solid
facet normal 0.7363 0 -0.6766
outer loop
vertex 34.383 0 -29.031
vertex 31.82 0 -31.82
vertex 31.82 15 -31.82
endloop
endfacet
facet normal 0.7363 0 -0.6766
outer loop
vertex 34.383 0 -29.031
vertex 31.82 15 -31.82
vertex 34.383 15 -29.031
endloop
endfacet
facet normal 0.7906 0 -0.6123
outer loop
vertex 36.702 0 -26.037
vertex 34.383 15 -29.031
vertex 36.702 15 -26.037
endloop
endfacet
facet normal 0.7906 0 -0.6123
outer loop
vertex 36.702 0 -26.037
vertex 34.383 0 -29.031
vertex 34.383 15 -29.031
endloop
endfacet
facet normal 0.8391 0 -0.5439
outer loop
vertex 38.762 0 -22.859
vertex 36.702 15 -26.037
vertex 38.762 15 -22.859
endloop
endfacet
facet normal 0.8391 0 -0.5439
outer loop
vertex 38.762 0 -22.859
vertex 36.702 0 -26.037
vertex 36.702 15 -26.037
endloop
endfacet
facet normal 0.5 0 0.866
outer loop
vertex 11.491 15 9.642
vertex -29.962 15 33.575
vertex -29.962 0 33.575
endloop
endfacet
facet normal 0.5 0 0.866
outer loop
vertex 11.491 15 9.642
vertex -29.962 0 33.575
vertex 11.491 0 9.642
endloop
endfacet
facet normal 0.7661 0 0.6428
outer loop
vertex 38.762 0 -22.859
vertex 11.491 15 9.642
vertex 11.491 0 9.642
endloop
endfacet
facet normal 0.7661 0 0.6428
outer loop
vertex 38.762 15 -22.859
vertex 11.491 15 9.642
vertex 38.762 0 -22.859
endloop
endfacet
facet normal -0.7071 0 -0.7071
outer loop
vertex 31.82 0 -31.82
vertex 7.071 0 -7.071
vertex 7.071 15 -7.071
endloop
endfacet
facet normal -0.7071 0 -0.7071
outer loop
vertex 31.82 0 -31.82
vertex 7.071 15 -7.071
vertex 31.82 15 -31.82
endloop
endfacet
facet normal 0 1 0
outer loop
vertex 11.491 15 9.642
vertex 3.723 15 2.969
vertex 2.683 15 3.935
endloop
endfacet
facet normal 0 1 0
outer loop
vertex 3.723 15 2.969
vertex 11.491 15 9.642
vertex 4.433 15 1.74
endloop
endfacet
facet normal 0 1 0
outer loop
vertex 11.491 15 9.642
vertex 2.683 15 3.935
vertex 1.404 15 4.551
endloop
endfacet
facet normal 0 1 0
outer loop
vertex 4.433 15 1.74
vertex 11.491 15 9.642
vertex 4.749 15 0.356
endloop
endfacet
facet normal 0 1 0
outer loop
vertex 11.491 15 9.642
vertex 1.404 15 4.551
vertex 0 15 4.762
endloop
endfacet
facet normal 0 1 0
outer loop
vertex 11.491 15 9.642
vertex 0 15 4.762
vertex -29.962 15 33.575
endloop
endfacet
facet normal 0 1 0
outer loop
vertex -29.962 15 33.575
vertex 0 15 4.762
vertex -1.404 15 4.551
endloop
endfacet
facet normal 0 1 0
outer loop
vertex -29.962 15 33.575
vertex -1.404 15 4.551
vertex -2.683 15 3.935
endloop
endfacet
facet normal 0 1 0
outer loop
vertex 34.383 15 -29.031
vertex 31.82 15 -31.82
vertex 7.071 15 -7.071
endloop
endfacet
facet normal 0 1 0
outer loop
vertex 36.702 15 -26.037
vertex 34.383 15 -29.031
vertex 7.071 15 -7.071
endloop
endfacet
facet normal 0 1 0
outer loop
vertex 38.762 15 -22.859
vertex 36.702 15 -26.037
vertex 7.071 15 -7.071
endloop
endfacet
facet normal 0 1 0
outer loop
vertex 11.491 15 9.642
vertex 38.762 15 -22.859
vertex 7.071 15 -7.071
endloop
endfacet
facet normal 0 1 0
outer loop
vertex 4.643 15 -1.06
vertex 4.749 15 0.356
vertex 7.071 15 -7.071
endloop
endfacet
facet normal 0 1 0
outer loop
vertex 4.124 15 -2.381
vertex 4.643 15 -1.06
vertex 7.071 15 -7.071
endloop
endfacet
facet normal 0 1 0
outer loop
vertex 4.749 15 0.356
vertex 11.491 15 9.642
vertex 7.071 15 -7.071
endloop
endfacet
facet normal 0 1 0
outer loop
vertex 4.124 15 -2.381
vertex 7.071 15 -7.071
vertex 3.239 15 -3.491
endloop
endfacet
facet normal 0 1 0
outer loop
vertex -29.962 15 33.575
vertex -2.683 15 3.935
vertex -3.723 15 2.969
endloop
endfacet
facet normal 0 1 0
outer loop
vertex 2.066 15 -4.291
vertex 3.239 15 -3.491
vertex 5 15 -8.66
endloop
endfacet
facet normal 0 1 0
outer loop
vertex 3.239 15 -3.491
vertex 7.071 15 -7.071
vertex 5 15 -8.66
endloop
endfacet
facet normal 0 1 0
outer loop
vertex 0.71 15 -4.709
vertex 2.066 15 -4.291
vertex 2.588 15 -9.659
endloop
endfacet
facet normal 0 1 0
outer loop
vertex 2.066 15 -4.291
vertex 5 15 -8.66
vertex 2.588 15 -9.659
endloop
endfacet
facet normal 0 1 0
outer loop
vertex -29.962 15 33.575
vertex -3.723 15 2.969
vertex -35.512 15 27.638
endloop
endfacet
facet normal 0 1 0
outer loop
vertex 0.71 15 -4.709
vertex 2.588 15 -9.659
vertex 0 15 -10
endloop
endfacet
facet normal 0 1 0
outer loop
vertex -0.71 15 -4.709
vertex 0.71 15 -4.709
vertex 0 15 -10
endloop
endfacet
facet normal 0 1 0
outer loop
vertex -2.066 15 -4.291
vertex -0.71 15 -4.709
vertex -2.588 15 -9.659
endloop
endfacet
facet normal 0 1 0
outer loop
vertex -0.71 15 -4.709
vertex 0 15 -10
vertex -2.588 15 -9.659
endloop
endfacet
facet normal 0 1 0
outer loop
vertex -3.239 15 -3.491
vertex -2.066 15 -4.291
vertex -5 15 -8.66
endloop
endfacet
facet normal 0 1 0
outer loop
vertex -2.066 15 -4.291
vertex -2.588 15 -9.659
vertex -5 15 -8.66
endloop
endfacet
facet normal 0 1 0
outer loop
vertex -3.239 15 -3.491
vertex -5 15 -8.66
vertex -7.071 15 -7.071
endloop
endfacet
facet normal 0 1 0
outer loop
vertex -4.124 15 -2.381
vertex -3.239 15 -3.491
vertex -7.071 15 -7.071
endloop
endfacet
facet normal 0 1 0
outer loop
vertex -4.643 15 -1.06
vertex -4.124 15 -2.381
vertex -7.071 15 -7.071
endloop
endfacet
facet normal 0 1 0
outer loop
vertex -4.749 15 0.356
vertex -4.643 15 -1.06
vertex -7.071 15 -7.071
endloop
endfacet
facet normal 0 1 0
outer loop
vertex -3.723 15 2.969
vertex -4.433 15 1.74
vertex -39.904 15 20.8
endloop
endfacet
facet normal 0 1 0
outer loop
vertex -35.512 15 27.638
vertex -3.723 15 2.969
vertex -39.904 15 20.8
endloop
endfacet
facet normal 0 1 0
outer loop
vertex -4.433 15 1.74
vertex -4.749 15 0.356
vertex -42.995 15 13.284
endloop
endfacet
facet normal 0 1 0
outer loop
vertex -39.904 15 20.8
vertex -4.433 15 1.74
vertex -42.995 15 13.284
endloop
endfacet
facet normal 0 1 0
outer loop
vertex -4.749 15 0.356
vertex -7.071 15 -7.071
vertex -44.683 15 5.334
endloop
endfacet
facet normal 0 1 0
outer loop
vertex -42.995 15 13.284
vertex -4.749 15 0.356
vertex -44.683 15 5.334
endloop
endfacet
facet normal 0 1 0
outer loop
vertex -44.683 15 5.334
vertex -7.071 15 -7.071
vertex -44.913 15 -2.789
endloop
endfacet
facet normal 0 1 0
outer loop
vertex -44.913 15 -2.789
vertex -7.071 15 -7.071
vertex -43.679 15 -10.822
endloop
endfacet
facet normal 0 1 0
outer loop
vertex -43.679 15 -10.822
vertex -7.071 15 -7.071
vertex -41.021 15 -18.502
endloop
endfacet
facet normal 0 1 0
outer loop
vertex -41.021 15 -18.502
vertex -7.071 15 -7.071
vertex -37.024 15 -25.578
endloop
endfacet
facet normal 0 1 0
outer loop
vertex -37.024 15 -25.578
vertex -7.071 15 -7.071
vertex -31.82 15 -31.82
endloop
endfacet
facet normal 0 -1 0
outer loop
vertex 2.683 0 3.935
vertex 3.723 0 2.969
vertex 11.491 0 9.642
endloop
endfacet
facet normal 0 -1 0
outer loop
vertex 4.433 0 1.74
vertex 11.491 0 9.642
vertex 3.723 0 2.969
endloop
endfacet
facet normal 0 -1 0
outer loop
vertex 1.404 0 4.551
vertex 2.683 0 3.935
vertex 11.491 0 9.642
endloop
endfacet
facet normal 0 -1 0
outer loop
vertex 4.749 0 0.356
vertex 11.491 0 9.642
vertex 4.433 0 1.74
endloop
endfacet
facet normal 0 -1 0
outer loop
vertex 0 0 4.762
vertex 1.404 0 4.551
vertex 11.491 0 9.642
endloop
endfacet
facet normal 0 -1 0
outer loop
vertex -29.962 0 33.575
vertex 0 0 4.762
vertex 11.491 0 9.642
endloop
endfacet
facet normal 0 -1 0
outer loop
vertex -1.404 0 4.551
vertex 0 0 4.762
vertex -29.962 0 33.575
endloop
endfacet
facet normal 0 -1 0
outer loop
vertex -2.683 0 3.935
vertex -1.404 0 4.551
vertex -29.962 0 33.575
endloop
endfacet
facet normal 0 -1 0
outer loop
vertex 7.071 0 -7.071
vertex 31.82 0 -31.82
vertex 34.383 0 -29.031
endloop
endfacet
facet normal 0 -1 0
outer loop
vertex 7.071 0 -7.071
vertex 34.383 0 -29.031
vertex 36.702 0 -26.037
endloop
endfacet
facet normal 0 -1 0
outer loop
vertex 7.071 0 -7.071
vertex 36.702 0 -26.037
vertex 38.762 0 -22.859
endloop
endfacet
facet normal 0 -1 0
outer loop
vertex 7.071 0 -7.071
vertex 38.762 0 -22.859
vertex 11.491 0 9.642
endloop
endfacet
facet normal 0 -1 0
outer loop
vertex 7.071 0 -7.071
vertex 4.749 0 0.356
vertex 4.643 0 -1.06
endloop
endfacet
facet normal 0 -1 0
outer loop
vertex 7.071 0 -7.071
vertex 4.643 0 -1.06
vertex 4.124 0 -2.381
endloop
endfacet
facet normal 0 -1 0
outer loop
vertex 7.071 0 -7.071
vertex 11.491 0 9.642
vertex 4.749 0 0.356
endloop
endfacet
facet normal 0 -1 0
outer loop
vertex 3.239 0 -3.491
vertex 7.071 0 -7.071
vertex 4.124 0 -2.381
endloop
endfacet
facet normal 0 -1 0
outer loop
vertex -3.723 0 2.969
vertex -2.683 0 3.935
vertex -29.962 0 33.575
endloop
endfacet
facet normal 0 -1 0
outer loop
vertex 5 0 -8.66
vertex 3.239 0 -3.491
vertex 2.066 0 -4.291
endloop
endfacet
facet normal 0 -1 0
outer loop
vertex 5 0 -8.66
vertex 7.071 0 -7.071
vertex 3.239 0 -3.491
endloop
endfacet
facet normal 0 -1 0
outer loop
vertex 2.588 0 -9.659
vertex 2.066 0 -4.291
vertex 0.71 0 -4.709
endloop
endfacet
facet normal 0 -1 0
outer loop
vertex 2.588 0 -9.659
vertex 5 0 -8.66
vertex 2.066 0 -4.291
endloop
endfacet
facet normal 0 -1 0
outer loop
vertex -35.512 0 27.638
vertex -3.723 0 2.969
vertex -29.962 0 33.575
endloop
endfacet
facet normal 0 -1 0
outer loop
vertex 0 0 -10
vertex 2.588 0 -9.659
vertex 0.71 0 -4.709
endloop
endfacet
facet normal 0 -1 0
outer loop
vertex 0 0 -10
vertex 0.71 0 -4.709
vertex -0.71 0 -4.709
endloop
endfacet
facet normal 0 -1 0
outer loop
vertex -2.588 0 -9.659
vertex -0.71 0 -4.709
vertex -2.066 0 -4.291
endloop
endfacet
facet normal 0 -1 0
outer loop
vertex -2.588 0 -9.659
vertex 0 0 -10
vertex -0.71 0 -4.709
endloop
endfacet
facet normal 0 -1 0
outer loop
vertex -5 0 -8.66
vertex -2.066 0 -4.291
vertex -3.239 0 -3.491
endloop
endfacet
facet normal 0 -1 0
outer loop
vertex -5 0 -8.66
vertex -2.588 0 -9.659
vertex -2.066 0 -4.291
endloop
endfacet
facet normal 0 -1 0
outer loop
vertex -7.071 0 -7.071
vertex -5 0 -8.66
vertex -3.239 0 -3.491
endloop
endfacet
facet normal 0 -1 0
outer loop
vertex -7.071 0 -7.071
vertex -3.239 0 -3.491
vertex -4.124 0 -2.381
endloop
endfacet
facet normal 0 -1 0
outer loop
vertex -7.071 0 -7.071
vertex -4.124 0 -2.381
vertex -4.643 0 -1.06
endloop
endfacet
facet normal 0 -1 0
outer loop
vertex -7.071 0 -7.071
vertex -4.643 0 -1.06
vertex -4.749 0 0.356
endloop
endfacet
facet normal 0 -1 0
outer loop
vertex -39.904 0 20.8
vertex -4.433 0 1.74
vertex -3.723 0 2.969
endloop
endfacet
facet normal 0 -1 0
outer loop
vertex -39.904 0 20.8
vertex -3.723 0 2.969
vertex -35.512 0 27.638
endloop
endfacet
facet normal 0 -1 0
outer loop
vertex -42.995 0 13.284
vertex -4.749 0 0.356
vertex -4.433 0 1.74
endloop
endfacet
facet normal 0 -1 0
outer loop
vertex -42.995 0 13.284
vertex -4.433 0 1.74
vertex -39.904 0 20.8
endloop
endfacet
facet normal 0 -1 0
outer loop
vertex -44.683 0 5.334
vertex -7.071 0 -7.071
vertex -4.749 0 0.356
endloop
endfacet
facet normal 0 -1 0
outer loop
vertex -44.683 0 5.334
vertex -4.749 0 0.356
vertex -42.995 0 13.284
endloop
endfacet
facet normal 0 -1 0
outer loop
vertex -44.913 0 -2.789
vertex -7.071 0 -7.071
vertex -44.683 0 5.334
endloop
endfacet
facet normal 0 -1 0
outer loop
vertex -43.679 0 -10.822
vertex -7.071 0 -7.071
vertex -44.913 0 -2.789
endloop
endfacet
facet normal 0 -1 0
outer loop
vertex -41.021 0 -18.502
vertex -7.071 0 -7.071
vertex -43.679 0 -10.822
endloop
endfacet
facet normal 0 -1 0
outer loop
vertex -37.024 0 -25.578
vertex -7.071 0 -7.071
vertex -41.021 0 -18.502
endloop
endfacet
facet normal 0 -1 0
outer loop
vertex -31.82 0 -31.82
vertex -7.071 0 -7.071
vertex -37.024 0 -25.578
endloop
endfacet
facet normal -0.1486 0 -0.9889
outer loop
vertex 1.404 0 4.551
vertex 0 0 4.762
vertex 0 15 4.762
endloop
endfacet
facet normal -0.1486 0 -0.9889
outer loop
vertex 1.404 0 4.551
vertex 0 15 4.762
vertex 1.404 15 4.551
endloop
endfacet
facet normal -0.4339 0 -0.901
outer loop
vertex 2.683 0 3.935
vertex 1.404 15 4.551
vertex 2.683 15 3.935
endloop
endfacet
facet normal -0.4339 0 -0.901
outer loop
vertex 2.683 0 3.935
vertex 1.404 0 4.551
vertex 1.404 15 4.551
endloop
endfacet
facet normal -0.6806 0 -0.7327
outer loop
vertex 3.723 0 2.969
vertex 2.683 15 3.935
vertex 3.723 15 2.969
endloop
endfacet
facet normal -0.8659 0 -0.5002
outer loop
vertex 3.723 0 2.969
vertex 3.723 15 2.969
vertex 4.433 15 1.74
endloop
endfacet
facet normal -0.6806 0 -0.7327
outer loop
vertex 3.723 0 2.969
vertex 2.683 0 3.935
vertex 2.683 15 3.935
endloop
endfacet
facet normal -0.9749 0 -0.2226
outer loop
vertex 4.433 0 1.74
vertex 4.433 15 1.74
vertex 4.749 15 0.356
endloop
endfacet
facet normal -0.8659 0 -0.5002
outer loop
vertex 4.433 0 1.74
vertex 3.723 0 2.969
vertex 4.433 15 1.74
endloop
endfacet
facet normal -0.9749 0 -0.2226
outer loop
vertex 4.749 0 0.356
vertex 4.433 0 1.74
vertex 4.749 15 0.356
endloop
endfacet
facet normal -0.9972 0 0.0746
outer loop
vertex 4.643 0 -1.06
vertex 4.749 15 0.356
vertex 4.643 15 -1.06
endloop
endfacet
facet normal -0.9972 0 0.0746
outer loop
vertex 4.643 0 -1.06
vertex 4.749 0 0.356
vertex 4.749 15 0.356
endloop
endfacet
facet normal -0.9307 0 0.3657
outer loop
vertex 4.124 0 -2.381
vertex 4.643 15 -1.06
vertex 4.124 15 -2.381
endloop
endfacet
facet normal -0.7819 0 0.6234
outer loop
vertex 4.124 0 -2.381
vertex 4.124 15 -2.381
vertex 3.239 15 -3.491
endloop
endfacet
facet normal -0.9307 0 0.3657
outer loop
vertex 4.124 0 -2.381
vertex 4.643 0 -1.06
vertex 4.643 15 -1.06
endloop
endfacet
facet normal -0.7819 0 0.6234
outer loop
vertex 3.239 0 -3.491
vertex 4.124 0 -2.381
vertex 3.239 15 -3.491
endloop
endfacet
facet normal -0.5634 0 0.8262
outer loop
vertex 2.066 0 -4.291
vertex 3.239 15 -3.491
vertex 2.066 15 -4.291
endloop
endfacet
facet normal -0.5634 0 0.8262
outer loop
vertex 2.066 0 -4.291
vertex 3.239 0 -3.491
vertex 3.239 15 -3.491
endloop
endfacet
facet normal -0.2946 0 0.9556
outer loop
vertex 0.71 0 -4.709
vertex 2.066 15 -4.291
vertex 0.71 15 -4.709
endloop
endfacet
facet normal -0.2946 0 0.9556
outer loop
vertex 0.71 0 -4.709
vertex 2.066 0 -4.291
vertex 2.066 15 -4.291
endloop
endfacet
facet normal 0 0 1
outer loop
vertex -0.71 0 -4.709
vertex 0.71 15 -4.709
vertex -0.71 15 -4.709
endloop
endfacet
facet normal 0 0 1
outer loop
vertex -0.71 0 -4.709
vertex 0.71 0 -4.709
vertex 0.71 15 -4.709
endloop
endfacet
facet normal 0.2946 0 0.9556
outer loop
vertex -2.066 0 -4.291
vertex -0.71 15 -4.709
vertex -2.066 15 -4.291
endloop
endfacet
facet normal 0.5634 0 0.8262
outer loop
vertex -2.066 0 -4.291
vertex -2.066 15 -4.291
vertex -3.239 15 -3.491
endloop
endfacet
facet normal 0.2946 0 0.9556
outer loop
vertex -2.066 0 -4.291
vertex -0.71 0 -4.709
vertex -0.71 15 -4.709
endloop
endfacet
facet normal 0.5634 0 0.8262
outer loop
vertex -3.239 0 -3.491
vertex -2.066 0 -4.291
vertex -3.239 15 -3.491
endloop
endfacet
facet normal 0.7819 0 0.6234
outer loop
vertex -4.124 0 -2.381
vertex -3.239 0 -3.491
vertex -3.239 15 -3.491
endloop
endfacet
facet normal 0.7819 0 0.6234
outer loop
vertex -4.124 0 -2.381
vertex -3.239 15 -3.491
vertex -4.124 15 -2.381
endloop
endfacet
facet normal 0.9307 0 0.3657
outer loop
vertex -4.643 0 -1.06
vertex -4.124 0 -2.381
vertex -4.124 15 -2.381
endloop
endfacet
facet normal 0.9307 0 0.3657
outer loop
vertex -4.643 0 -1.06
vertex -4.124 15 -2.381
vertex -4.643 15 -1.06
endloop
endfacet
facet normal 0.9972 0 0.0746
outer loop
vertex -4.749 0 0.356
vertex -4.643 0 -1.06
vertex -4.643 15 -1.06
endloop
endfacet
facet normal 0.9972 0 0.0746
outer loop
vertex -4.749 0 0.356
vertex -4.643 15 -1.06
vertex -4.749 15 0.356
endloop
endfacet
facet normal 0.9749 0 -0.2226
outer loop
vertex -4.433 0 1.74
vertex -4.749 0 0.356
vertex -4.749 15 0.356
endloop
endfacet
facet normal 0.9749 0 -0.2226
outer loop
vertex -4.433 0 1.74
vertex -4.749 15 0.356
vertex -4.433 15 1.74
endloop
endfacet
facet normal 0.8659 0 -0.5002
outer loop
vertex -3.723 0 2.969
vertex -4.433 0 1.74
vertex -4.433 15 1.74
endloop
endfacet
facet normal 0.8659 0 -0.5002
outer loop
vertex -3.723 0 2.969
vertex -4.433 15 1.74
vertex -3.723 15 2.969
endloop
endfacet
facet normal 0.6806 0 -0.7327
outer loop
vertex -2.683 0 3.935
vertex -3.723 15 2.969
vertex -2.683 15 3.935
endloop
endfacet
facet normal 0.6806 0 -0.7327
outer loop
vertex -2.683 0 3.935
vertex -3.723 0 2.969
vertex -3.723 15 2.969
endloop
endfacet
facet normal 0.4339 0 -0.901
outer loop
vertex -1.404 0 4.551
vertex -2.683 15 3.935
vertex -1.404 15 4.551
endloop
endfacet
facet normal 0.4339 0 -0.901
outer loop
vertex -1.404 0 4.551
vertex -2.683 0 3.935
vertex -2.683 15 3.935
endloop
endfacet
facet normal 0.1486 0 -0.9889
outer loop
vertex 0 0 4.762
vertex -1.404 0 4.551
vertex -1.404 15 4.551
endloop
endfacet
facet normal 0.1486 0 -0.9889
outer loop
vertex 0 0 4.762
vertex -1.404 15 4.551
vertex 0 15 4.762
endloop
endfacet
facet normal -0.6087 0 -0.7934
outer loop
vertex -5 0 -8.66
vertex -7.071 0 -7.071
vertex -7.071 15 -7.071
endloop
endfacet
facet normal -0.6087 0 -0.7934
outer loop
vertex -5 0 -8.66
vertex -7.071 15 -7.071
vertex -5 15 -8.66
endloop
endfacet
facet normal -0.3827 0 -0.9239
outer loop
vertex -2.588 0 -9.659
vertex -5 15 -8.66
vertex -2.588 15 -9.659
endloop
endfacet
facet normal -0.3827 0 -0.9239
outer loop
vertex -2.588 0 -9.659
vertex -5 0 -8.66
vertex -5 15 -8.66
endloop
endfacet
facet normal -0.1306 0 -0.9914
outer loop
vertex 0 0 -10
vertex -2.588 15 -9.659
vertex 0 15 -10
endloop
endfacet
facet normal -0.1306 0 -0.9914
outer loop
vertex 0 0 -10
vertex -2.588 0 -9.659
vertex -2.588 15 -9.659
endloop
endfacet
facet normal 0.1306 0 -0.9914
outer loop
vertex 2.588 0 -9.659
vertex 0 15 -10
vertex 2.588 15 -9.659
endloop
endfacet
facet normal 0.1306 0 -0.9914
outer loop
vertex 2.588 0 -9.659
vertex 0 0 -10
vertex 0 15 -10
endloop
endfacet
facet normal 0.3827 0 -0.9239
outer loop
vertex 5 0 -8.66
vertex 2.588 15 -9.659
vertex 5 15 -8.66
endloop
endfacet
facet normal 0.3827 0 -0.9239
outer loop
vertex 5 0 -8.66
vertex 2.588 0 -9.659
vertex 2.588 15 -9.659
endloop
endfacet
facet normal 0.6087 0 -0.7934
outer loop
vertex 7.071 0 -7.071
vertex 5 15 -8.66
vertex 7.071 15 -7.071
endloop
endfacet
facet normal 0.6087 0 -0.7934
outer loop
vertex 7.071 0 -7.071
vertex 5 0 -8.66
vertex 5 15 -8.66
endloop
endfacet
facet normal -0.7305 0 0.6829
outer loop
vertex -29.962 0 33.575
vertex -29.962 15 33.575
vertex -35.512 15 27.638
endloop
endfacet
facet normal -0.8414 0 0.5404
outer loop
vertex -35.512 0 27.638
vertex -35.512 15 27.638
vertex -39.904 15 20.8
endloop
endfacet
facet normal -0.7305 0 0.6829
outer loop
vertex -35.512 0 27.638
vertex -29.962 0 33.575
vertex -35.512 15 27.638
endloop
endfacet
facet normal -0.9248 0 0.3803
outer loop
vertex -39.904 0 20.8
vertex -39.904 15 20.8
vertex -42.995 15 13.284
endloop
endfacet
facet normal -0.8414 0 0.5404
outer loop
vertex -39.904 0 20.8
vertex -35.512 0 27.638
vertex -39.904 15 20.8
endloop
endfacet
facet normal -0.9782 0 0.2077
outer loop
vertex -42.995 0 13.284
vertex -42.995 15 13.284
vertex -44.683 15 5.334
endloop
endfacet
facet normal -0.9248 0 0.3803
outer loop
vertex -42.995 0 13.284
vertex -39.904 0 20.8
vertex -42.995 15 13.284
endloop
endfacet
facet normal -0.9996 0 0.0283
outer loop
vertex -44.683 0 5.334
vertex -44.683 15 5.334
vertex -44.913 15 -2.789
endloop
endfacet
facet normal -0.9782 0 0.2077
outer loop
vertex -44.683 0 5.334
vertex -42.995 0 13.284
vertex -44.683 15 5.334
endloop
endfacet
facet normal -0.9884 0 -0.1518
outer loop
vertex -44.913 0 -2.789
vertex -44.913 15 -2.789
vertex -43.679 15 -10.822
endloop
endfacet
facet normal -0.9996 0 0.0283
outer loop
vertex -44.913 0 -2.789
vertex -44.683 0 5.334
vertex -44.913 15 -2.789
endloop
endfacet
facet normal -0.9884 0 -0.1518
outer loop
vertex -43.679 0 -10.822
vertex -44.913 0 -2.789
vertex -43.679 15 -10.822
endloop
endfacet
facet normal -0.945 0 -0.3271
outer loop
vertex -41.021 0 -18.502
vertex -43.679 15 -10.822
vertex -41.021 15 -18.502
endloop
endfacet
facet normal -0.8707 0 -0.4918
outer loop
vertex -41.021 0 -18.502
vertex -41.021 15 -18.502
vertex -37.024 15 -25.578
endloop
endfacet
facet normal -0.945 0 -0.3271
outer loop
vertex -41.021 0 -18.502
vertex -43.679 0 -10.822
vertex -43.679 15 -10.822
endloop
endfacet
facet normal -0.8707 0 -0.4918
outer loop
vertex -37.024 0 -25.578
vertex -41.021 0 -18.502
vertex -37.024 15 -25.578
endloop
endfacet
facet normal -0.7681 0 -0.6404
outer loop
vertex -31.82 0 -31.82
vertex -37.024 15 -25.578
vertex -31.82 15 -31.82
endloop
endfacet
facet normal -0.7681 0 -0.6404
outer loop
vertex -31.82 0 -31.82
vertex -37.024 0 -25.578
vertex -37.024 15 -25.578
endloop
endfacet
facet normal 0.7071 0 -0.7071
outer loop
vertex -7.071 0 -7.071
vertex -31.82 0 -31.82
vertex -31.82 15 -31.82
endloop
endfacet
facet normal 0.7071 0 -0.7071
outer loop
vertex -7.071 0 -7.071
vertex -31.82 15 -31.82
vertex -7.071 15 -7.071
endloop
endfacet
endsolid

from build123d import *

# Parameters (mm, degrees)
SKETCH1_R           = 4.7625
BOSS_EXTRUDE1_DEPTH = 15
CUT_EXTRUDE1_DEPTH  = 66.383484153


with BuildPart() as part:
    # Sketch1 → Boss-Extrude1 (new body)
    with BuildSketch(Plane(origin=(0, 0, 0), x_dir=(1, 0, 0), z_dir=(0, 1, 0))):
        with BuildLine():
            Line((-31.819805153, 31.819805153), (-7.071067812, 7.071067812))
            ThreePointArc((-7.071067812, 7.071067812), (0, 10), (7.071067812, 7.071067812))
            Line((7.071067812, 7.071067812), (31.819805153, 31.819805153))
            ThreePointArc((31.819805153, 31.819805153), (0, -45), (-31.819805153, 31.819805153))
        make_face()
        with Locations(Location((0, 0, 0), (0, 0, 270))):
            Circle(SKETCH1_R, mode=Mode.SUBTRACT)
    extrude(amount=BOSS_EXTRUDE1_DEPTH)

    # Sketch4 → Cut-Extrude1 (cut, through all)
    with BuildSketch(Plane(origin=(0, 15, 0), x_dir=(1, 0, 0), z_dir=(0, 1, 0))):
        with BuildLine():
            Line((11.490666647, -9.641814145), (45.503789868, 30.893447649))
            ThreePointArc((45.503789868, 30.893447649), (34.992750198, -42.432386612), (-38.992939572, -38.788537785))
            Line((-38.992939572, -38.788537785), (11.490666647, -9.641814145))
        make_face()
    extrude(amount=-CUT_EXTRUDE1_DEPTH, mode=Mode.SUBTRACT)


solid = part.part
